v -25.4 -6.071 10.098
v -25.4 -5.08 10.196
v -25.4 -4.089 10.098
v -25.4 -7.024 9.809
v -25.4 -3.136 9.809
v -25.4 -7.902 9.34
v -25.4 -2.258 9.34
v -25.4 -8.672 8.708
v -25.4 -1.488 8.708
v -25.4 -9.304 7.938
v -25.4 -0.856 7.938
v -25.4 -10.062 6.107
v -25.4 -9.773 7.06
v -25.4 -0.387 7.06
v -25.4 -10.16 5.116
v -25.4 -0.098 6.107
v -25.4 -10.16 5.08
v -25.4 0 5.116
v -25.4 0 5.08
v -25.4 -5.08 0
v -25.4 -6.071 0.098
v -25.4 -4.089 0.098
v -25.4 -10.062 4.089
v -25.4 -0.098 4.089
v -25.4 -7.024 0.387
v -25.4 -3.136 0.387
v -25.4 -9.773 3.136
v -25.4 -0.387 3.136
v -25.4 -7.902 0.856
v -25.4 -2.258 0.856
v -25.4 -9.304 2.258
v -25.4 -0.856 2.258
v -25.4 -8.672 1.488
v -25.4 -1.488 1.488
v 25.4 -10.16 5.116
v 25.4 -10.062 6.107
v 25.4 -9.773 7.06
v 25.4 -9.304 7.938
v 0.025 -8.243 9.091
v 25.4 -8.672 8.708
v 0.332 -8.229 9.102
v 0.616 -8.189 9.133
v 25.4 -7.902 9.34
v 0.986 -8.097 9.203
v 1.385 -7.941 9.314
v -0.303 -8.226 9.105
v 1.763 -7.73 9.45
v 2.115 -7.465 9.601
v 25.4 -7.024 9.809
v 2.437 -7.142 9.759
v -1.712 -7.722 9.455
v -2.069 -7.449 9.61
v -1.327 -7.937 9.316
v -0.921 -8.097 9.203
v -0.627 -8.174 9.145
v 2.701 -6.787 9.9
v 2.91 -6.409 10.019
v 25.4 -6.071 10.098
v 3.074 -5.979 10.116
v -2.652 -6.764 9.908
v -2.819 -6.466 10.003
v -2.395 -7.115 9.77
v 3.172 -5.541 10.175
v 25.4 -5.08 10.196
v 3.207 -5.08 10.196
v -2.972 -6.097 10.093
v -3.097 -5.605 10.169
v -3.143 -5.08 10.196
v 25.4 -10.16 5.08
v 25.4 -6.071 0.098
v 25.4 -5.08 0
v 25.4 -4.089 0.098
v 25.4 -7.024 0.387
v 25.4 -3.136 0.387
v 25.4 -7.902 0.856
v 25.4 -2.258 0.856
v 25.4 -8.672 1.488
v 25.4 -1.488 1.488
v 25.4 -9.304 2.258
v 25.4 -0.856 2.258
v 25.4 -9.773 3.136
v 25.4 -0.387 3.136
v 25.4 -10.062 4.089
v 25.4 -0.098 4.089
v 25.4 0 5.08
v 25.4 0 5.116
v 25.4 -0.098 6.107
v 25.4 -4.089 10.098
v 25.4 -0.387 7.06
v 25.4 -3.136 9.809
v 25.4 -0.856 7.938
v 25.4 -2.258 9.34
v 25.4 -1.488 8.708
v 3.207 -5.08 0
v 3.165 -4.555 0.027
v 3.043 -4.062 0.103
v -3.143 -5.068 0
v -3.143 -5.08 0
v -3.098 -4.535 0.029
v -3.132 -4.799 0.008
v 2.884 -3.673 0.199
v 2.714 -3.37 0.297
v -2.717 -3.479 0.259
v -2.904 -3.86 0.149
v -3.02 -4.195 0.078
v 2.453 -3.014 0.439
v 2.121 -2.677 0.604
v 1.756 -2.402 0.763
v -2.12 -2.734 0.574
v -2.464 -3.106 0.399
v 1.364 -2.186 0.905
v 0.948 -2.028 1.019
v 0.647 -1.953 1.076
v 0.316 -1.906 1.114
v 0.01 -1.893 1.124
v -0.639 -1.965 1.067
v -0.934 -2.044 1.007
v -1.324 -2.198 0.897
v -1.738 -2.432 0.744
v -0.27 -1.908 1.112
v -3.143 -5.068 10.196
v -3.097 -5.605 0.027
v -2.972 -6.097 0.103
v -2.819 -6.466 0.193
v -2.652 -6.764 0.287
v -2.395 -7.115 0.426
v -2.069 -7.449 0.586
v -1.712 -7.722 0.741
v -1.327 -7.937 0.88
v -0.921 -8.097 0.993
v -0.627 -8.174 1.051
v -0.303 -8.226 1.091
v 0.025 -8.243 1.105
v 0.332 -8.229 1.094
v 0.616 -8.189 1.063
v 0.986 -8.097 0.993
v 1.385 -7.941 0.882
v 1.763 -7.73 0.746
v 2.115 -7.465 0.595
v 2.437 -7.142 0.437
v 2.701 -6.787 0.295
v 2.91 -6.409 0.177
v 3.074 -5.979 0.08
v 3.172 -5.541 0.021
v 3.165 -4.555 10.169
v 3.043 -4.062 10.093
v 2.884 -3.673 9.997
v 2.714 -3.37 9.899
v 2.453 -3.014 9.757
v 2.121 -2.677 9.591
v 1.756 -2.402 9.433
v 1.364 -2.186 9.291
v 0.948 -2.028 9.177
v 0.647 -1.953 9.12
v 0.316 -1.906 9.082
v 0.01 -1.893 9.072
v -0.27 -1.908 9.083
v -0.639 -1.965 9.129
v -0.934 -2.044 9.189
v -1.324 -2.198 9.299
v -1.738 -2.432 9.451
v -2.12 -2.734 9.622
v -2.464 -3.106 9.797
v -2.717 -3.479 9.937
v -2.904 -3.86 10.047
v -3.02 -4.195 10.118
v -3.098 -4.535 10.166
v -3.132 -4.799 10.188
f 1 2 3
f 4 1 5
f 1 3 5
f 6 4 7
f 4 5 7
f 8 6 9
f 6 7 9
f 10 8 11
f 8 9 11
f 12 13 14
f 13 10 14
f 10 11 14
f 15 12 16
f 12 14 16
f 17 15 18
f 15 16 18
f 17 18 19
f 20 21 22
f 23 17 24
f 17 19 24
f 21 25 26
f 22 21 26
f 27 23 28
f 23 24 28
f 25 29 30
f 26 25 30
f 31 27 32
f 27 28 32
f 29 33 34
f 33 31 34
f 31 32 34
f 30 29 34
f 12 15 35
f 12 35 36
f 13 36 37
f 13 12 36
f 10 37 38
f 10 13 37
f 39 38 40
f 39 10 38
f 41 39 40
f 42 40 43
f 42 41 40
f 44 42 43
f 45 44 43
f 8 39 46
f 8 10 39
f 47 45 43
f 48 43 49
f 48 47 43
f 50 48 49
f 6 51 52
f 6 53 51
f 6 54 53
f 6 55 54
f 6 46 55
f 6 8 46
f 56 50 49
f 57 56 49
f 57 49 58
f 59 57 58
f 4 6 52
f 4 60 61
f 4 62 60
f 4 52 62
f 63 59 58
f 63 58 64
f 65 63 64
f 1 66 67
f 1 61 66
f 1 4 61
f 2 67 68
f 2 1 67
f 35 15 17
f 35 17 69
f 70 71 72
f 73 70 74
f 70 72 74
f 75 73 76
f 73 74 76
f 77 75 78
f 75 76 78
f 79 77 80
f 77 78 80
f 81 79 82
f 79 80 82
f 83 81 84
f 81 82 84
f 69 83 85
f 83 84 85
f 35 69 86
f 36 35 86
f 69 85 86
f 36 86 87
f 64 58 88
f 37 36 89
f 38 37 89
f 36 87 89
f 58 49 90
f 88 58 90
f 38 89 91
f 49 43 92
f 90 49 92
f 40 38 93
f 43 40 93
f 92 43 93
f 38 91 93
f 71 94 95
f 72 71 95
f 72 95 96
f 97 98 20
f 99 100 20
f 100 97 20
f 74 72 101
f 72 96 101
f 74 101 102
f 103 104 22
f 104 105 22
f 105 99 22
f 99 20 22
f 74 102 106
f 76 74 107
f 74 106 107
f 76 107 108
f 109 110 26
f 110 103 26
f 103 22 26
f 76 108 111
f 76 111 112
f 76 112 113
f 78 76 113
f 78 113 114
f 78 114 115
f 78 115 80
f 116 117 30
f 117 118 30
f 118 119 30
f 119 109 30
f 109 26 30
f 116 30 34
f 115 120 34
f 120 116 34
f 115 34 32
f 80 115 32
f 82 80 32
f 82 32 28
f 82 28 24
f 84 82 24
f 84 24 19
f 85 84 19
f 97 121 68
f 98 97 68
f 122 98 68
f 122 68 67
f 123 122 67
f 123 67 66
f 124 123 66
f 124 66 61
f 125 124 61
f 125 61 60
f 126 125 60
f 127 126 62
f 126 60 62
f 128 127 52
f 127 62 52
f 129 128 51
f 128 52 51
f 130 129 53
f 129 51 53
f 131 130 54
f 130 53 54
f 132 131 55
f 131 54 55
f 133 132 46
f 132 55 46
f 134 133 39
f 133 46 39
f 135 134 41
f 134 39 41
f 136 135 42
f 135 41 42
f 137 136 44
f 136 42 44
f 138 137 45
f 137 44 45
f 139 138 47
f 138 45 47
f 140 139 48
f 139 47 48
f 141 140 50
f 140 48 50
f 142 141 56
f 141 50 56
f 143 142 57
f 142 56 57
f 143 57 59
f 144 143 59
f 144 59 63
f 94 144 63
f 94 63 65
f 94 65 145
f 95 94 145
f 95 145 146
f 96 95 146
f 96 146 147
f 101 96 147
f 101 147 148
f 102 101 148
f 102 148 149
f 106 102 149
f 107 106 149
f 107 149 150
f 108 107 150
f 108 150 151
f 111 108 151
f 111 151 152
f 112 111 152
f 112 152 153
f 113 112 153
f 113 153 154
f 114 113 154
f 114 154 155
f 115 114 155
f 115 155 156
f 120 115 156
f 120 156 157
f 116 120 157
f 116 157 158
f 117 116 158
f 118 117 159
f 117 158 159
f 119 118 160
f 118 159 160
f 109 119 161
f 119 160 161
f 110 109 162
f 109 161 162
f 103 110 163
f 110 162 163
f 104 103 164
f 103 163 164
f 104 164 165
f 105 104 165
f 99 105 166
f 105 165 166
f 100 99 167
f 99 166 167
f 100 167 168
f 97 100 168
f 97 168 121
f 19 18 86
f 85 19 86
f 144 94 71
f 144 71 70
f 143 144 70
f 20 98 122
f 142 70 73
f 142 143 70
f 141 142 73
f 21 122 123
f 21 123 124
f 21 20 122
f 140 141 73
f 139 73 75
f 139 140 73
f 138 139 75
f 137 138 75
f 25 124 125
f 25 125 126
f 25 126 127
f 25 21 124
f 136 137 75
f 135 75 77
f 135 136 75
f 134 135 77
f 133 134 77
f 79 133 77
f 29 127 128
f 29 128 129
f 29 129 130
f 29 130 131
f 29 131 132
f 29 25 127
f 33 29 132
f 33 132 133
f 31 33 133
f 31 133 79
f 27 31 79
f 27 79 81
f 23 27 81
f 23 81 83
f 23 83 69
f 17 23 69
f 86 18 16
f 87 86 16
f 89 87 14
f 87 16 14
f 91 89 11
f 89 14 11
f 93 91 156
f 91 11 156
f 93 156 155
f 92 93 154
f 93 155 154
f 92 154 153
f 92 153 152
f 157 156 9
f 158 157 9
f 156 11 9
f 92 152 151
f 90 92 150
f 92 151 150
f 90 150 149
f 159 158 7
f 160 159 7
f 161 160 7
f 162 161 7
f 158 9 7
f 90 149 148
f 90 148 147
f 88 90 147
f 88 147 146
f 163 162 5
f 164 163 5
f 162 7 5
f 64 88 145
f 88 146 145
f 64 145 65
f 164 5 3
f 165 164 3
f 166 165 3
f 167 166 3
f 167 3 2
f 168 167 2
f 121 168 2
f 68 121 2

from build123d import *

# Parameters (mm, degrees)
F1_DEPTH    = 10.16
F3_D        = 6.35
F4_T1_DEPTH = 76.2


# Not quite as in the source:
# - a fillet or chamfer that OpenCascade refuses, or shapes differently, is made with other operations: its cross-section is extruded or revolved along the edge and cut away or added


with BuildPart() as f1:
    # F0 (on Front) → F1 (new body)
    with BuildSketch(Plane.XZ):
        Polygon((-25.4, 0), (0, 0), (25.4, 0), (25.4, 10.1957246661), (0, 10.1957246661), (-25.4, 10.1957246661), align=None)
    extrude(amount=F1_DEPTH)

    # F3 (through all)
    with Locations(Plane(origin=(0, 0, 0), x_dir=(1, 0, 0), z_dir=(0, 0, -1))):
        with Locations((0.0320593305, 5.0682155415)):
            Hole(F3_D / 2)

    # F4: fillet of radius 5.08 on 4 edges, made by hand

    # F4_s2 → F4_t1 (cut)
    with BuildSketch(Plane.YZ.offset(-38.1)):
        with BuildLine():
            ThreePointArc((-10.16, 5.1157246661), (-8.6721024484, 8.7078271145), (-5.08, 10.1957246661))
            Line((-5.08, 10.1957246661), (-10.16, 10.1957246661))
            Line((-10.16, 10.1957246661), (-10.16, 5.1157246661))
        make_face()
        with BuildLine():
            ThreePointArc((0, 5.1157246661), (-1.4878975516, 8.7078271145), (-5.08, 10.1957246661))
            Line((-5.08, 10.1957246661), (0, 10.1957246661))
            Line((0, 10.1957246661), (0, 5.1157246661))
        make_face()
        with BuildLine():
            ThreePointArc((-5.08, 0), (-8.6721024484, 1.4878975516), (-10.16, 5.08))
            Line((-10.16, 5.08), (-10.16, 0))
            Line((-10.16, 0), (-5.08, 0))
        make_face()
        with BuildLine():
            ThreePointArc((-5.08, 0), (-1.4878975516, 1.4878975516), (0, 5.08))
            Line((0, 5.08), (0, 0))
            Line((0, 0), (-5.08, 0))
        make_face()
    extrude(amount=F4_T1_DEPTH, mode=Mode.SUBTRACT)


solid = f1.part
